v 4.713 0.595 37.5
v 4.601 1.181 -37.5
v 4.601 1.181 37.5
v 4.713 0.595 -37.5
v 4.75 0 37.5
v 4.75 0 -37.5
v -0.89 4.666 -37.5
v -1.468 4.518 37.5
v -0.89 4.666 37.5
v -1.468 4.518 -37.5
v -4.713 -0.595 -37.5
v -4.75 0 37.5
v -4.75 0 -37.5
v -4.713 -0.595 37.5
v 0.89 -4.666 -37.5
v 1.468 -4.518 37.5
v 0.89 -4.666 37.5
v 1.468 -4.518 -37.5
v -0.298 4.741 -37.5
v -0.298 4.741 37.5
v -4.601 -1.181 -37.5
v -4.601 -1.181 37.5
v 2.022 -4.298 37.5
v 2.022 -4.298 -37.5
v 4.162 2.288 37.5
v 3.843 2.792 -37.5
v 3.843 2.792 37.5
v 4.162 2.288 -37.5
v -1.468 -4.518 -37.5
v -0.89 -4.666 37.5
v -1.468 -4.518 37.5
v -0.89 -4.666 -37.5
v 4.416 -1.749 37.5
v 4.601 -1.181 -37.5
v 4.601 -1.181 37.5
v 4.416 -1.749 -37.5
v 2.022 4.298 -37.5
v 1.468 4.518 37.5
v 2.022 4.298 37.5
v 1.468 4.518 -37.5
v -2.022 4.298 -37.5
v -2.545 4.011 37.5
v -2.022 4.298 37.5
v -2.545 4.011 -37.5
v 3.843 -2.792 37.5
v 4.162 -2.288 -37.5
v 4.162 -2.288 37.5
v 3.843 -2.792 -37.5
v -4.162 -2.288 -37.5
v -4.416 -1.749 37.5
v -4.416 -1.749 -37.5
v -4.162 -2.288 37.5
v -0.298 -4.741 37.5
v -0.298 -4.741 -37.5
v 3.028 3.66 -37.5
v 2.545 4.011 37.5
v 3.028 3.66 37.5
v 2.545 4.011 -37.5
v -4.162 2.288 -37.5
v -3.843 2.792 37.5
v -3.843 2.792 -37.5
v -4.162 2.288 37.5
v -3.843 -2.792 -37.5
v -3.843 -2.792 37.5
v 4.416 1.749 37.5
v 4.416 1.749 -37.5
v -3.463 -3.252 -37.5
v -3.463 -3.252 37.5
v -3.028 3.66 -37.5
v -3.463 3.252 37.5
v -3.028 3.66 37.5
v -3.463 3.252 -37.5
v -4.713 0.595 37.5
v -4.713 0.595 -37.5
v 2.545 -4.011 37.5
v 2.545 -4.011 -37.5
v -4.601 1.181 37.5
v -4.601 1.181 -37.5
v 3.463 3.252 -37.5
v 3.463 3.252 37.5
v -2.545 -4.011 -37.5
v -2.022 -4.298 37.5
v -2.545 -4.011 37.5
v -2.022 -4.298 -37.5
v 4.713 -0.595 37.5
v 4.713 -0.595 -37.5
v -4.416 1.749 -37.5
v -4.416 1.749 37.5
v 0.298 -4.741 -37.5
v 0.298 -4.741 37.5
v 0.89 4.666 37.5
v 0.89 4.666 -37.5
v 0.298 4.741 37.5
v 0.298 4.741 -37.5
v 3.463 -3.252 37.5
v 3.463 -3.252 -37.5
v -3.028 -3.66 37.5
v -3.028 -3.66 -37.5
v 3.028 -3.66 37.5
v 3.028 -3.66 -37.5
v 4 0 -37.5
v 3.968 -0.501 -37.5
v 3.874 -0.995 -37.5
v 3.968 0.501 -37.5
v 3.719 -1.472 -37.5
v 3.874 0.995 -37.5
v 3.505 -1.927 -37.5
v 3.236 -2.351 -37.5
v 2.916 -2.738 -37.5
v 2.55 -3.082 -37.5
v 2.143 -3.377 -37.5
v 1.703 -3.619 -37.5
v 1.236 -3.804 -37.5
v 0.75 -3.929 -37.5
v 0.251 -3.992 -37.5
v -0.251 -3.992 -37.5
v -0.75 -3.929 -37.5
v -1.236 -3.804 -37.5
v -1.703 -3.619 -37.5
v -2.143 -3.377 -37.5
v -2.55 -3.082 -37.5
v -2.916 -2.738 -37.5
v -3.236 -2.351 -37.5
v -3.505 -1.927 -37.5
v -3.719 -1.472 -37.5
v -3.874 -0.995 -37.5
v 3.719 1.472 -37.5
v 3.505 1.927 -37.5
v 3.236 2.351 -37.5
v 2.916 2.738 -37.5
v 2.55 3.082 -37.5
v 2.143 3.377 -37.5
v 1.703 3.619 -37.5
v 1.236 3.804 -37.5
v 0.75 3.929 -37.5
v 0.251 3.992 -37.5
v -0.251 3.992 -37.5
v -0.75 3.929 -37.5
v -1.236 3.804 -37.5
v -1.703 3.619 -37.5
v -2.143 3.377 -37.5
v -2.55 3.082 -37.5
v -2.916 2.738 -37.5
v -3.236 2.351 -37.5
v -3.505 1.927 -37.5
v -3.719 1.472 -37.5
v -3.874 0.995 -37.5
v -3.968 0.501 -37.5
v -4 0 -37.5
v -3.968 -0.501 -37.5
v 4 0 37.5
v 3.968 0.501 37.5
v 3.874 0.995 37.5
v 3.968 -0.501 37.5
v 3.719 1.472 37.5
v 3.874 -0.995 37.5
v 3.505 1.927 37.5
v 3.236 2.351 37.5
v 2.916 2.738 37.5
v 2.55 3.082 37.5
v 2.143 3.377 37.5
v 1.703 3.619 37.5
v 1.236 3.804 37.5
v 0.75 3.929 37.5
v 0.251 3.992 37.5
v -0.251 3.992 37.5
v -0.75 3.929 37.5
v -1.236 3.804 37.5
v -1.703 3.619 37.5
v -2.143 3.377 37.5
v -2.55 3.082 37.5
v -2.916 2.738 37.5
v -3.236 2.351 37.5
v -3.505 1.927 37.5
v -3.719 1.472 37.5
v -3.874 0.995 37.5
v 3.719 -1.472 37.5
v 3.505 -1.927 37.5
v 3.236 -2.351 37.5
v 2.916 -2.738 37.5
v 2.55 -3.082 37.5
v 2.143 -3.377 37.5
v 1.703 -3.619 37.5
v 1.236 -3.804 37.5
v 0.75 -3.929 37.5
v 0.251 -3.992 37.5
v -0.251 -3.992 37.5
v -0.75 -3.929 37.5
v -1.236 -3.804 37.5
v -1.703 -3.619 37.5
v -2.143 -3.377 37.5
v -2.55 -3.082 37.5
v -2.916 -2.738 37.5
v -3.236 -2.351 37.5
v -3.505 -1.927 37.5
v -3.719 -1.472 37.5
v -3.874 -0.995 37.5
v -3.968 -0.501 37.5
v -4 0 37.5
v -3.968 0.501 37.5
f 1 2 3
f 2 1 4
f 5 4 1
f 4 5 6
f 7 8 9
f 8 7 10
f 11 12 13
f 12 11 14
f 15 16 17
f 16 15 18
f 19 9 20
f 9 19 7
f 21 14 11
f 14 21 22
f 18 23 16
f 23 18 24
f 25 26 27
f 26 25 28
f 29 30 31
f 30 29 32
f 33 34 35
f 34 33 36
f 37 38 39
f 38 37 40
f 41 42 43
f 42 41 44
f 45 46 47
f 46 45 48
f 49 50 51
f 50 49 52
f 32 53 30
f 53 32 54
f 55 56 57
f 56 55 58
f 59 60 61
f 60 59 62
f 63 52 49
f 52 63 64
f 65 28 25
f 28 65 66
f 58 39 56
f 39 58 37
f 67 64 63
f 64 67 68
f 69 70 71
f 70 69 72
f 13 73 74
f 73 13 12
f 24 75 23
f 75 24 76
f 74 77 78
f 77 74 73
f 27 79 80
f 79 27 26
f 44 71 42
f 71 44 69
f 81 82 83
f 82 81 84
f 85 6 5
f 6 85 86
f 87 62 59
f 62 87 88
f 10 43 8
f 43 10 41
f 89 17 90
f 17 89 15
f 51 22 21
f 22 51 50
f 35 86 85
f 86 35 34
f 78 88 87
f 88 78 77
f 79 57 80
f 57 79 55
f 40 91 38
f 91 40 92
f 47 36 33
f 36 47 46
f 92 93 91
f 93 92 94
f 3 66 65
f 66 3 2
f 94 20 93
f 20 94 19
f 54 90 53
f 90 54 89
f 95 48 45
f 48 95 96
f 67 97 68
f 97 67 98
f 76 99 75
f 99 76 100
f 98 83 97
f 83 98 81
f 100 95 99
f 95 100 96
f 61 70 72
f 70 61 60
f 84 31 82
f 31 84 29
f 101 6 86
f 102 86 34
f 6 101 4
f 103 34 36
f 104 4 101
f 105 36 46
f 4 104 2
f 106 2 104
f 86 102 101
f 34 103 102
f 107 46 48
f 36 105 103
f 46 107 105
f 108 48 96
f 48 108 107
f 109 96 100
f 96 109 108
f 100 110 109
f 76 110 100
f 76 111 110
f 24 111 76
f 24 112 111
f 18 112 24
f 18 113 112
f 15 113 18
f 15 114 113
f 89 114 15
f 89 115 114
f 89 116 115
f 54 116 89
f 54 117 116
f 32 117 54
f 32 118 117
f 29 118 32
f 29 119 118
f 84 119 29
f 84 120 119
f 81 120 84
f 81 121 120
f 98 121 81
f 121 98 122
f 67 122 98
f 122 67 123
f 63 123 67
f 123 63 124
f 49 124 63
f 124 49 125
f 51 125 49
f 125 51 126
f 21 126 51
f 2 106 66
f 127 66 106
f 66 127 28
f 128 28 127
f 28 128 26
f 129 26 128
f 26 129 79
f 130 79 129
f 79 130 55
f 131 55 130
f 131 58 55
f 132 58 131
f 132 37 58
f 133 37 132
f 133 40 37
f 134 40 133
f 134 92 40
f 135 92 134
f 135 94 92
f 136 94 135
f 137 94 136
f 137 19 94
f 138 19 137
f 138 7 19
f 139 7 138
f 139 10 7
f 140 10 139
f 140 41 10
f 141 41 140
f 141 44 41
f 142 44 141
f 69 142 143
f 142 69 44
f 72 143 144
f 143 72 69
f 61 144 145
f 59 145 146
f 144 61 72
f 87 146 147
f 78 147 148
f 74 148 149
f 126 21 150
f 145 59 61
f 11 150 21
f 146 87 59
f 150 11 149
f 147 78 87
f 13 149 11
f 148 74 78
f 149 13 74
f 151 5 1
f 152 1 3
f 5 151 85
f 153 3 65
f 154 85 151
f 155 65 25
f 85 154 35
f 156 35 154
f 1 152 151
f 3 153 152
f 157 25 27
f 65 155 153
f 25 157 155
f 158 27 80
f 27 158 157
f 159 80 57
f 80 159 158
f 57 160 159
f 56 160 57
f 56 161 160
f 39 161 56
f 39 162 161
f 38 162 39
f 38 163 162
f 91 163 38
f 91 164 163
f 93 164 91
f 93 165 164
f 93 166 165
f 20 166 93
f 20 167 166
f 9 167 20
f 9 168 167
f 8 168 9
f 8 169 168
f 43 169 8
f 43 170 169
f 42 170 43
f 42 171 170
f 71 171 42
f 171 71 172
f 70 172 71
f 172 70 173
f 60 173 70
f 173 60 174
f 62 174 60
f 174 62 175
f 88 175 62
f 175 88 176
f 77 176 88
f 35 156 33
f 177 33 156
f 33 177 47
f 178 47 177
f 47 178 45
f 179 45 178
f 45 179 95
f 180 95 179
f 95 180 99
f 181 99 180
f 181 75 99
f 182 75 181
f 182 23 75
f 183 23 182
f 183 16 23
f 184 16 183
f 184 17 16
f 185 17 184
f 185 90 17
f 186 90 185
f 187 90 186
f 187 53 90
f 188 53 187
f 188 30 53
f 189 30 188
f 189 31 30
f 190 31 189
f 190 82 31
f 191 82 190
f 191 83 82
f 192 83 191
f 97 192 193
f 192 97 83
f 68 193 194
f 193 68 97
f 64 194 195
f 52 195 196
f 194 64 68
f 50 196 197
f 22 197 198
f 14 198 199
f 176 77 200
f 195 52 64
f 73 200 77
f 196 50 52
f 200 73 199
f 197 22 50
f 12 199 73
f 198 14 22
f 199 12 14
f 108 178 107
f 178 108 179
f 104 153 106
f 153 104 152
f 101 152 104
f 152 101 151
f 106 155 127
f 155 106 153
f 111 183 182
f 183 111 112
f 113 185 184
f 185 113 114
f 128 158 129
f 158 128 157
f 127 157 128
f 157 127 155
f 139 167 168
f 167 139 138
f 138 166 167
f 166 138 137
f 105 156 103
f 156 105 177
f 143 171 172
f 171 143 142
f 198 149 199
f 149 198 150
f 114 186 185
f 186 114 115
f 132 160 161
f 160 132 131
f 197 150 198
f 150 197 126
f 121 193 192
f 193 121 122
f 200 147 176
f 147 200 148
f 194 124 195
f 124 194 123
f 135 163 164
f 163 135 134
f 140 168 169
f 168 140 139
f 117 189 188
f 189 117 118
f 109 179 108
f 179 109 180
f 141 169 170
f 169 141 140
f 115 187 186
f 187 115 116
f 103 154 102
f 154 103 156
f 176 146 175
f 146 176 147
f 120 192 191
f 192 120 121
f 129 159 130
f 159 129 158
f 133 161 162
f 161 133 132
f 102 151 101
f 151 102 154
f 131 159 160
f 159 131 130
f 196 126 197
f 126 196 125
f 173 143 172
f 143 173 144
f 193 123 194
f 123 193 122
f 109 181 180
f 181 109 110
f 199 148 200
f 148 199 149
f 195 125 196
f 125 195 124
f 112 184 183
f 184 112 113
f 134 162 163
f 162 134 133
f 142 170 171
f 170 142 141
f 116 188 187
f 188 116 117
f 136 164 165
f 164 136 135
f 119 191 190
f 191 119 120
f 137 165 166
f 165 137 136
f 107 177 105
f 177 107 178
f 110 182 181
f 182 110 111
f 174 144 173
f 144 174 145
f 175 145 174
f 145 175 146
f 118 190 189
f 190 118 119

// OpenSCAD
$fn = 50;


difference() {
	union() {
		translate(v = [0, 0, -37.5000000000]) {
			cylinder(h = 75, r = 4.7500000000);
		}
	}
	union() {
		translate(v = [0, 0, -100.0000000000]) {
			cylinder(h = 200, r = 4.0000000000);
		}
	}
}
